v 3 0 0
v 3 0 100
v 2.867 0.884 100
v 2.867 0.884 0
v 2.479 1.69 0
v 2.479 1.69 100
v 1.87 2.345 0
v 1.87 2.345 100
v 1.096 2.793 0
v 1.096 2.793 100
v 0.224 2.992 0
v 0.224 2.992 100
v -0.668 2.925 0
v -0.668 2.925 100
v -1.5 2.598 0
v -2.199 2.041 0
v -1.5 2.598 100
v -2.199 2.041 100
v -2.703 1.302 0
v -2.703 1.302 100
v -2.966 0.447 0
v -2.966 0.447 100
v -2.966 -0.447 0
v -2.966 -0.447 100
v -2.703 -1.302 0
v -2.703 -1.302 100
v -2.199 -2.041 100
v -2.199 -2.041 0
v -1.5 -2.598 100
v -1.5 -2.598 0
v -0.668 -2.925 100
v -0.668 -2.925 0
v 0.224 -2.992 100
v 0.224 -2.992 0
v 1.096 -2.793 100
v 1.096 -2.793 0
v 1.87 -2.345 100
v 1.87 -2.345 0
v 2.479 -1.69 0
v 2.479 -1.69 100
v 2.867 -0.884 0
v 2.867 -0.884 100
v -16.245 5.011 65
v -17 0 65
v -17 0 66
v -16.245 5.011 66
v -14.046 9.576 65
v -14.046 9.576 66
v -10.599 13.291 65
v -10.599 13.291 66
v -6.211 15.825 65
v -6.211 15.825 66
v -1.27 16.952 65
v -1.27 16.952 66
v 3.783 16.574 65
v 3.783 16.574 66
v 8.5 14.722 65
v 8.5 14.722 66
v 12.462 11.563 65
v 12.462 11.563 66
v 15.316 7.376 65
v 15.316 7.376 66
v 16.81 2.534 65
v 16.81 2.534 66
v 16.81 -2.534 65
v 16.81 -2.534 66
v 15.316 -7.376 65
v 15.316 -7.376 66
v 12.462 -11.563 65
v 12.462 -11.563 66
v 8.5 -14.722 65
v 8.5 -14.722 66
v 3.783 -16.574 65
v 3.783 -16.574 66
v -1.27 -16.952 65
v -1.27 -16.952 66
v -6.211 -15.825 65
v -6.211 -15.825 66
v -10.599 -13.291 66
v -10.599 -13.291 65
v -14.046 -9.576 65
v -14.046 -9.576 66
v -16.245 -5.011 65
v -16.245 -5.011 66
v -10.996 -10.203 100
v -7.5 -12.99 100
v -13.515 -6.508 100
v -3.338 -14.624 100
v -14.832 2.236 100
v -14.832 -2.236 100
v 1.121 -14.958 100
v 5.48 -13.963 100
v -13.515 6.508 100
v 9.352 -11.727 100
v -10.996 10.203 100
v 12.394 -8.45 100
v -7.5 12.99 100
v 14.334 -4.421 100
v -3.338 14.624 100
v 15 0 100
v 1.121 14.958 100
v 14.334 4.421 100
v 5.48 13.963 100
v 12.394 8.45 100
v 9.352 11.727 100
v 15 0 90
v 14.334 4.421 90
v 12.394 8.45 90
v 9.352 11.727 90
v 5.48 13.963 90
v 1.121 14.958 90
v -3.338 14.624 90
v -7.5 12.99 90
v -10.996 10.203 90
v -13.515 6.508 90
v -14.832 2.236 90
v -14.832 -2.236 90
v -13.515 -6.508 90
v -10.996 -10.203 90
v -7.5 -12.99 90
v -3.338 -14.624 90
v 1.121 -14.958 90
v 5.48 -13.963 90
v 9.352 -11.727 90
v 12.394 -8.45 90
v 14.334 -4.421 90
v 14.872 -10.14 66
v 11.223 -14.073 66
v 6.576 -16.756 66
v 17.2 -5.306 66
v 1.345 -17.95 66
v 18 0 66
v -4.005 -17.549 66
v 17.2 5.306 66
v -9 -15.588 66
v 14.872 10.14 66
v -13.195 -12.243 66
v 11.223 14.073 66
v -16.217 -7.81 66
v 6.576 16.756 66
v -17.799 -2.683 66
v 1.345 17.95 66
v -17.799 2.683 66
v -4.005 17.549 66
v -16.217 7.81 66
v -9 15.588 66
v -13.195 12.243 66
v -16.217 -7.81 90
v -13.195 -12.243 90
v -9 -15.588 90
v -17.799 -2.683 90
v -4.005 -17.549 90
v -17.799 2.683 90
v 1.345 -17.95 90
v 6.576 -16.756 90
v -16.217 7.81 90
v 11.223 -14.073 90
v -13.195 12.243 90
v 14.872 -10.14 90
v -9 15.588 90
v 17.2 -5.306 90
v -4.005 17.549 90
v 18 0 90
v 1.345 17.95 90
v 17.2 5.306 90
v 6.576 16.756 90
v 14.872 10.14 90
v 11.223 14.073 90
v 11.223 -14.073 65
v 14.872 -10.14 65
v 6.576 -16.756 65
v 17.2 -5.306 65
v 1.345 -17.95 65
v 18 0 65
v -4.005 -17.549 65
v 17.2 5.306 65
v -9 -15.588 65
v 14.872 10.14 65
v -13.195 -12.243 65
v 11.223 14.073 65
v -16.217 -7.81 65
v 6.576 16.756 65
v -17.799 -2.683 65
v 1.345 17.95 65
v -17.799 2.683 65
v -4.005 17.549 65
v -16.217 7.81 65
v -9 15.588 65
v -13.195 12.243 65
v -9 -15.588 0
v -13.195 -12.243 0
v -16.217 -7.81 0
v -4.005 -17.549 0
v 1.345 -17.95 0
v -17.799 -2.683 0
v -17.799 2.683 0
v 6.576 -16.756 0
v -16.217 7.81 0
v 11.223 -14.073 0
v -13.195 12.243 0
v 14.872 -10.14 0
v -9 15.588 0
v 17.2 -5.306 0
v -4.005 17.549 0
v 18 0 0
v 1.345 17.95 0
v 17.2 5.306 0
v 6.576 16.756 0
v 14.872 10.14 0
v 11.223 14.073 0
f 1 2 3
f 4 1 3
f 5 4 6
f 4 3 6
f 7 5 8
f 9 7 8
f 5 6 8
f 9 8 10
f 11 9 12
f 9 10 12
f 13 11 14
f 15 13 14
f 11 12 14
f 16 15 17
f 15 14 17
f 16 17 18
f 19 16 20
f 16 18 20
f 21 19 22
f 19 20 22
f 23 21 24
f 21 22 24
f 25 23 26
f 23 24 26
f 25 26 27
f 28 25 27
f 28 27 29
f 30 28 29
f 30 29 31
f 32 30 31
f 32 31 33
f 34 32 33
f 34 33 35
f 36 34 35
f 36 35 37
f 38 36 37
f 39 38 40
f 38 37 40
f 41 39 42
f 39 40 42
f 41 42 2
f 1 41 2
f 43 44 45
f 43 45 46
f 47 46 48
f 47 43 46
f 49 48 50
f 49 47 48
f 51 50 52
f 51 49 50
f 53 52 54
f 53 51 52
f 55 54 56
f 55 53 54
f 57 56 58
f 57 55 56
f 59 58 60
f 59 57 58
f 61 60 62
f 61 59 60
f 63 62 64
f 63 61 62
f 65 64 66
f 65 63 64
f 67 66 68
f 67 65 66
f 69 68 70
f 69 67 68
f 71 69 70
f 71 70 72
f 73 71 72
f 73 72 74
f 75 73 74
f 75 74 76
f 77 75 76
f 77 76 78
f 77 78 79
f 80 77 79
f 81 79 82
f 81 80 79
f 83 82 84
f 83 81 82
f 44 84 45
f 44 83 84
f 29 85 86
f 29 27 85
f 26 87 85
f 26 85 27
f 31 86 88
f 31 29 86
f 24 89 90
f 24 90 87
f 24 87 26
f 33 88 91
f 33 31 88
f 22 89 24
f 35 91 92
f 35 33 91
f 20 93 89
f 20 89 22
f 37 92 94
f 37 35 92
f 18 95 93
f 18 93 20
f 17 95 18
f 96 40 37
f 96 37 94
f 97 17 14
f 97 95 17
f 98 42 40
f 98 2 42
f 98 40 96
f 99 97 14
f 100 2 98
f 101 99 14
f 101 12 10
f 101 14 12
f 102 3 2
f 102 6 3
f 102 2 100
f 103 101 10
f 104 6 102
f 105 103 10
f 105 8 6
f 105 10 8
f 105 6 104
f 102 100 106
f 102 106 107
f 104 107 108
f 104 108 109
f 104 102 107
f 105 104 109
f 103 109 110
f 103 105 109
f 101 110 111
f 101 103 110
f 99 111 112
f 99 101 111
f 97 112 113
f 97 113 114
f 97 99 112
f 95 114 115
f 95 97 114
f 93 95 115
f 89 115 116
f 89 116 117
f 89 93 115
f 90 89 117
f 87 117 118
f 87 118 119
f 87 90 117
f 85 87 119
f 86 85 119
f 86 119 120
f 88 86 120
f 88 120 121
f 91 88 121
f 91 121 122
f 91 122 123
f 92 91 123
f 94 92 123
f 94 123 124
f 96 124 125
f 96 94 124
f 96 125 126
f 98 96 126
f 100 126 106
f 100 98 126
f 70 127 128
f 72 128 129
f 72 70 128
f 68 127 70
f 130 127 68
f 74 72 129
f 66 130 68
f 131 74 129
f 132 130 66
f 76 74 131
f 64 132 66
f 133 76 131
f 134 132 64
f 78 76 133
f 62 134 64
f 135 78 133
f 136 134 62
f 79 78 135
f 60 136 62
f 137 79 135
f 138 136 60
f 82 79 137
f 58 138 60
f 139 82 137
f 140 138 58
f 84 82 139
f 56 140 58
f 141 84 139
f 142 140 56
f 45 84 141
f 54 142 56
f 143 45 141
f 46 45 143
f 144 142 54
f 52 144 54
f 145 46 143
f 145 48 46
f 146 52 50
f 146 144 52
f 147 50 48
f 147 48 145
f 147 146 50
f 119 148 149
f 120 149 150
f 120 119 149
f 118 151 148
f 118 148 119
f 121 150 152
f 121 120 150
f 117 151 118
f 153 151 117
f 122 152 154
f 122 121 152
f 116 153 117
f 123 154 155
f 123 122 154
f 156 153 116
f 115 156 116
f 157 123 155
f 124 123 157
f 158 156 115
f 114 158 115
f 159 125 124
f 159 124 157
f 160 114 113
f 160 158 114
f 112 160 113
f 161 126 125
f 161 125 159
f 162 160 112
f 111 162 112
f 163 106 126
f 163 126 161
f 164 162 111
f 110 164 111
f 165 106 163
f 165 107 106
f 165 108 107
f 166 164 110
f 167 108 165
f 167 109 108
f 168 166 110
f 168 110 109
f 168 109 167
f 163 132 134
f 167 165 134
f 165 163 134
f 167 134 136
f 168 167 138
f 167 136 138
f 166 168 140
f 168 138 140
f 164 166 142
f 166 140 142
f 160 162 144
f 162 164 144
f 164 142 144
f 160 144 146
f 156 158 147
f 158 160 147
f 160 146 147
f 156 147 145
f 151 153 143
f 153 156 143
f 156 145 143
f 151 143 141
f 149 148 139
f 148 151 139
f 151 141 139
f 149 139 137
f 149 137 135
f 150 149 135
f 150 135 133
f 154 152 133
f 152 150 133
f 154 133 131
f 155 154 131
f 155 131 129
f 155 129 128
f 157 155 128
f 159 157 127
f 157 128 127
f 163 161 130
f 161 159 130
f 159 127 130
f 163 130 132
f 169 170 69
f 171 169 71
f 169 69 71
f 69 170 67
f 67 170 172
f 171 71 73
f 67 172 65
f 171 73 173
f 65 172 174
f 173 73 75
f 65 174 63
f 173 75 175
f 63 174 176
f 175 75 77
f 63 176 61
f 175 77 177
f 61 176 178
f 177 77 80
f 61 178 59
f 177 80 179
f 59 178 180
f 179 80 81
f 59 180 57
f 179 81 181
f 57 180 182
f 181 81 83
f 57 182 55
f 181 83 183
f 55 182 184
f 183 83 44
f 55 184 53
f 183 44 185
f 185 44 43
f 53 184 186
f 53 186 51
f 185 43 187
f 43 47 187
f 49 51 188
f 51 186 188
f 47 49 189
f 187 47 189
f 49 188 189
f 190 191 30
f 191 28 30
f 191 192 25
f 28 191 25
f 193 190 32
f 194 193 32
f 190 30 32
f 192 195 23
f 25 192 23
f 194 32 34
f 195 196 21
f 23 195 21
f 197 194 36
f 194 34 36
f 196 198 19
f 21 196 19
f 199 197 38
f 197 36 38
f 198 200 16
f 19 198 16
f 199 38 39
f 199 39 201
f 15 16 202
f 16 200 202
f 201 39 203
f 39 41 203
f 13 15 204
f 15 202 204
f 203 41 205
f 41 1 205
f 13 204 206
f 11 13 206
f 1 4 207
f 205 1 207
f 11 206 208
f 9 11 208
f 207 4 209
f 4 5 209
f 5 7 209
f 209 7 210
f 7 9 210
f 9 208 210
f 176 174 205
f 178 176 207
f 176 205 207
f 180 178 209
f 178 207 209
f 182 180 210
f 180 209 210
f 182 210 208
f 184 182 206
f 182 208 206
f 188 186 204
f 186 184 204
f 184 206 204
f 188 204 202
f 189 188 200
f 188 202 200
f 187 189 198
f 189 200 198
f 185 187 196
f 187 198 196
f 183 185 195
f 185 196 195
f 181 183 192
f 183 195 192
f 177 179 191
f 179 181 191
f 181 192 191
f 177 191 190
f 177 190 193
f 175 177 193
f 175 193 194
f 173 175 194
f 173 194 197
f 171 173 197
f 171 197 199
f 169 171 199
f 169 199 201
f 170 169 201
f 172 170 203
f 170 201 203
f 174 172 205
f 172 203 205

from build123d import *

# Parameters (mm, degrees)
SKETCH1_R           = 18
BOSS_EXTRUDE1_DEPTH = 100
SKETCH2_R           = 25
SKETCH2_R_2         = 15
CUT_EXTRUDE2_DEPTH  = 10
SKETCH4_R           = 3
CUT_EXTRUDE3_DEPTH  = 100
SKETCH5_R           = 18
SKETCH5_R_2         = 17
CUT_EXTRUDE4_DEPTH  = 1


with BuildPart() as part:
    # Sketch1 → Boss-Extrude1 (new body)
    with BuildSketch(Plane.XY):
        Circle(SKETCH1_R)
    extrude(amount=BOSS_EXTRUDE1_DEPTH)

    # Sketch2 → Cut-Extrude2 (cut)
    with BuildSketch(Plane.XY.offset(100)):
        Circle(SKETCH2_R)
        Circle(SKETCH2_R_2, mode=Mode.SUBTRACT)
    extrude(amount=-CUT_EXTRUDE2_DEPTH, mode=Mode.SUBTRACT)

    # Sketch4 → Cut-Extrude3 (cut)
    with BuildSketch(Plane.XY.offset(100)):
        Circle(SKETCH4_R)
    extrude(amount=-CUT_EXTRUDE3_DEPTH, mode=Mode.SUBTRACT)

    # Sketch5 → Cut-Extrude4 (cut)
    with BuildSketch(Plane(origin=(0, 0, 65), x_dir=(-1, 0, 0), z_dir=(0, 0, -1))):
        Circle(SKETCH5_R)
        Circle(SKETCH5_R_2, mode=Mode.SUBTRACT)
    extrude(amount=-CUT_EXTRUDE4_DEPTH, mode=Mode.SUBTRACT)


solid = part.part
